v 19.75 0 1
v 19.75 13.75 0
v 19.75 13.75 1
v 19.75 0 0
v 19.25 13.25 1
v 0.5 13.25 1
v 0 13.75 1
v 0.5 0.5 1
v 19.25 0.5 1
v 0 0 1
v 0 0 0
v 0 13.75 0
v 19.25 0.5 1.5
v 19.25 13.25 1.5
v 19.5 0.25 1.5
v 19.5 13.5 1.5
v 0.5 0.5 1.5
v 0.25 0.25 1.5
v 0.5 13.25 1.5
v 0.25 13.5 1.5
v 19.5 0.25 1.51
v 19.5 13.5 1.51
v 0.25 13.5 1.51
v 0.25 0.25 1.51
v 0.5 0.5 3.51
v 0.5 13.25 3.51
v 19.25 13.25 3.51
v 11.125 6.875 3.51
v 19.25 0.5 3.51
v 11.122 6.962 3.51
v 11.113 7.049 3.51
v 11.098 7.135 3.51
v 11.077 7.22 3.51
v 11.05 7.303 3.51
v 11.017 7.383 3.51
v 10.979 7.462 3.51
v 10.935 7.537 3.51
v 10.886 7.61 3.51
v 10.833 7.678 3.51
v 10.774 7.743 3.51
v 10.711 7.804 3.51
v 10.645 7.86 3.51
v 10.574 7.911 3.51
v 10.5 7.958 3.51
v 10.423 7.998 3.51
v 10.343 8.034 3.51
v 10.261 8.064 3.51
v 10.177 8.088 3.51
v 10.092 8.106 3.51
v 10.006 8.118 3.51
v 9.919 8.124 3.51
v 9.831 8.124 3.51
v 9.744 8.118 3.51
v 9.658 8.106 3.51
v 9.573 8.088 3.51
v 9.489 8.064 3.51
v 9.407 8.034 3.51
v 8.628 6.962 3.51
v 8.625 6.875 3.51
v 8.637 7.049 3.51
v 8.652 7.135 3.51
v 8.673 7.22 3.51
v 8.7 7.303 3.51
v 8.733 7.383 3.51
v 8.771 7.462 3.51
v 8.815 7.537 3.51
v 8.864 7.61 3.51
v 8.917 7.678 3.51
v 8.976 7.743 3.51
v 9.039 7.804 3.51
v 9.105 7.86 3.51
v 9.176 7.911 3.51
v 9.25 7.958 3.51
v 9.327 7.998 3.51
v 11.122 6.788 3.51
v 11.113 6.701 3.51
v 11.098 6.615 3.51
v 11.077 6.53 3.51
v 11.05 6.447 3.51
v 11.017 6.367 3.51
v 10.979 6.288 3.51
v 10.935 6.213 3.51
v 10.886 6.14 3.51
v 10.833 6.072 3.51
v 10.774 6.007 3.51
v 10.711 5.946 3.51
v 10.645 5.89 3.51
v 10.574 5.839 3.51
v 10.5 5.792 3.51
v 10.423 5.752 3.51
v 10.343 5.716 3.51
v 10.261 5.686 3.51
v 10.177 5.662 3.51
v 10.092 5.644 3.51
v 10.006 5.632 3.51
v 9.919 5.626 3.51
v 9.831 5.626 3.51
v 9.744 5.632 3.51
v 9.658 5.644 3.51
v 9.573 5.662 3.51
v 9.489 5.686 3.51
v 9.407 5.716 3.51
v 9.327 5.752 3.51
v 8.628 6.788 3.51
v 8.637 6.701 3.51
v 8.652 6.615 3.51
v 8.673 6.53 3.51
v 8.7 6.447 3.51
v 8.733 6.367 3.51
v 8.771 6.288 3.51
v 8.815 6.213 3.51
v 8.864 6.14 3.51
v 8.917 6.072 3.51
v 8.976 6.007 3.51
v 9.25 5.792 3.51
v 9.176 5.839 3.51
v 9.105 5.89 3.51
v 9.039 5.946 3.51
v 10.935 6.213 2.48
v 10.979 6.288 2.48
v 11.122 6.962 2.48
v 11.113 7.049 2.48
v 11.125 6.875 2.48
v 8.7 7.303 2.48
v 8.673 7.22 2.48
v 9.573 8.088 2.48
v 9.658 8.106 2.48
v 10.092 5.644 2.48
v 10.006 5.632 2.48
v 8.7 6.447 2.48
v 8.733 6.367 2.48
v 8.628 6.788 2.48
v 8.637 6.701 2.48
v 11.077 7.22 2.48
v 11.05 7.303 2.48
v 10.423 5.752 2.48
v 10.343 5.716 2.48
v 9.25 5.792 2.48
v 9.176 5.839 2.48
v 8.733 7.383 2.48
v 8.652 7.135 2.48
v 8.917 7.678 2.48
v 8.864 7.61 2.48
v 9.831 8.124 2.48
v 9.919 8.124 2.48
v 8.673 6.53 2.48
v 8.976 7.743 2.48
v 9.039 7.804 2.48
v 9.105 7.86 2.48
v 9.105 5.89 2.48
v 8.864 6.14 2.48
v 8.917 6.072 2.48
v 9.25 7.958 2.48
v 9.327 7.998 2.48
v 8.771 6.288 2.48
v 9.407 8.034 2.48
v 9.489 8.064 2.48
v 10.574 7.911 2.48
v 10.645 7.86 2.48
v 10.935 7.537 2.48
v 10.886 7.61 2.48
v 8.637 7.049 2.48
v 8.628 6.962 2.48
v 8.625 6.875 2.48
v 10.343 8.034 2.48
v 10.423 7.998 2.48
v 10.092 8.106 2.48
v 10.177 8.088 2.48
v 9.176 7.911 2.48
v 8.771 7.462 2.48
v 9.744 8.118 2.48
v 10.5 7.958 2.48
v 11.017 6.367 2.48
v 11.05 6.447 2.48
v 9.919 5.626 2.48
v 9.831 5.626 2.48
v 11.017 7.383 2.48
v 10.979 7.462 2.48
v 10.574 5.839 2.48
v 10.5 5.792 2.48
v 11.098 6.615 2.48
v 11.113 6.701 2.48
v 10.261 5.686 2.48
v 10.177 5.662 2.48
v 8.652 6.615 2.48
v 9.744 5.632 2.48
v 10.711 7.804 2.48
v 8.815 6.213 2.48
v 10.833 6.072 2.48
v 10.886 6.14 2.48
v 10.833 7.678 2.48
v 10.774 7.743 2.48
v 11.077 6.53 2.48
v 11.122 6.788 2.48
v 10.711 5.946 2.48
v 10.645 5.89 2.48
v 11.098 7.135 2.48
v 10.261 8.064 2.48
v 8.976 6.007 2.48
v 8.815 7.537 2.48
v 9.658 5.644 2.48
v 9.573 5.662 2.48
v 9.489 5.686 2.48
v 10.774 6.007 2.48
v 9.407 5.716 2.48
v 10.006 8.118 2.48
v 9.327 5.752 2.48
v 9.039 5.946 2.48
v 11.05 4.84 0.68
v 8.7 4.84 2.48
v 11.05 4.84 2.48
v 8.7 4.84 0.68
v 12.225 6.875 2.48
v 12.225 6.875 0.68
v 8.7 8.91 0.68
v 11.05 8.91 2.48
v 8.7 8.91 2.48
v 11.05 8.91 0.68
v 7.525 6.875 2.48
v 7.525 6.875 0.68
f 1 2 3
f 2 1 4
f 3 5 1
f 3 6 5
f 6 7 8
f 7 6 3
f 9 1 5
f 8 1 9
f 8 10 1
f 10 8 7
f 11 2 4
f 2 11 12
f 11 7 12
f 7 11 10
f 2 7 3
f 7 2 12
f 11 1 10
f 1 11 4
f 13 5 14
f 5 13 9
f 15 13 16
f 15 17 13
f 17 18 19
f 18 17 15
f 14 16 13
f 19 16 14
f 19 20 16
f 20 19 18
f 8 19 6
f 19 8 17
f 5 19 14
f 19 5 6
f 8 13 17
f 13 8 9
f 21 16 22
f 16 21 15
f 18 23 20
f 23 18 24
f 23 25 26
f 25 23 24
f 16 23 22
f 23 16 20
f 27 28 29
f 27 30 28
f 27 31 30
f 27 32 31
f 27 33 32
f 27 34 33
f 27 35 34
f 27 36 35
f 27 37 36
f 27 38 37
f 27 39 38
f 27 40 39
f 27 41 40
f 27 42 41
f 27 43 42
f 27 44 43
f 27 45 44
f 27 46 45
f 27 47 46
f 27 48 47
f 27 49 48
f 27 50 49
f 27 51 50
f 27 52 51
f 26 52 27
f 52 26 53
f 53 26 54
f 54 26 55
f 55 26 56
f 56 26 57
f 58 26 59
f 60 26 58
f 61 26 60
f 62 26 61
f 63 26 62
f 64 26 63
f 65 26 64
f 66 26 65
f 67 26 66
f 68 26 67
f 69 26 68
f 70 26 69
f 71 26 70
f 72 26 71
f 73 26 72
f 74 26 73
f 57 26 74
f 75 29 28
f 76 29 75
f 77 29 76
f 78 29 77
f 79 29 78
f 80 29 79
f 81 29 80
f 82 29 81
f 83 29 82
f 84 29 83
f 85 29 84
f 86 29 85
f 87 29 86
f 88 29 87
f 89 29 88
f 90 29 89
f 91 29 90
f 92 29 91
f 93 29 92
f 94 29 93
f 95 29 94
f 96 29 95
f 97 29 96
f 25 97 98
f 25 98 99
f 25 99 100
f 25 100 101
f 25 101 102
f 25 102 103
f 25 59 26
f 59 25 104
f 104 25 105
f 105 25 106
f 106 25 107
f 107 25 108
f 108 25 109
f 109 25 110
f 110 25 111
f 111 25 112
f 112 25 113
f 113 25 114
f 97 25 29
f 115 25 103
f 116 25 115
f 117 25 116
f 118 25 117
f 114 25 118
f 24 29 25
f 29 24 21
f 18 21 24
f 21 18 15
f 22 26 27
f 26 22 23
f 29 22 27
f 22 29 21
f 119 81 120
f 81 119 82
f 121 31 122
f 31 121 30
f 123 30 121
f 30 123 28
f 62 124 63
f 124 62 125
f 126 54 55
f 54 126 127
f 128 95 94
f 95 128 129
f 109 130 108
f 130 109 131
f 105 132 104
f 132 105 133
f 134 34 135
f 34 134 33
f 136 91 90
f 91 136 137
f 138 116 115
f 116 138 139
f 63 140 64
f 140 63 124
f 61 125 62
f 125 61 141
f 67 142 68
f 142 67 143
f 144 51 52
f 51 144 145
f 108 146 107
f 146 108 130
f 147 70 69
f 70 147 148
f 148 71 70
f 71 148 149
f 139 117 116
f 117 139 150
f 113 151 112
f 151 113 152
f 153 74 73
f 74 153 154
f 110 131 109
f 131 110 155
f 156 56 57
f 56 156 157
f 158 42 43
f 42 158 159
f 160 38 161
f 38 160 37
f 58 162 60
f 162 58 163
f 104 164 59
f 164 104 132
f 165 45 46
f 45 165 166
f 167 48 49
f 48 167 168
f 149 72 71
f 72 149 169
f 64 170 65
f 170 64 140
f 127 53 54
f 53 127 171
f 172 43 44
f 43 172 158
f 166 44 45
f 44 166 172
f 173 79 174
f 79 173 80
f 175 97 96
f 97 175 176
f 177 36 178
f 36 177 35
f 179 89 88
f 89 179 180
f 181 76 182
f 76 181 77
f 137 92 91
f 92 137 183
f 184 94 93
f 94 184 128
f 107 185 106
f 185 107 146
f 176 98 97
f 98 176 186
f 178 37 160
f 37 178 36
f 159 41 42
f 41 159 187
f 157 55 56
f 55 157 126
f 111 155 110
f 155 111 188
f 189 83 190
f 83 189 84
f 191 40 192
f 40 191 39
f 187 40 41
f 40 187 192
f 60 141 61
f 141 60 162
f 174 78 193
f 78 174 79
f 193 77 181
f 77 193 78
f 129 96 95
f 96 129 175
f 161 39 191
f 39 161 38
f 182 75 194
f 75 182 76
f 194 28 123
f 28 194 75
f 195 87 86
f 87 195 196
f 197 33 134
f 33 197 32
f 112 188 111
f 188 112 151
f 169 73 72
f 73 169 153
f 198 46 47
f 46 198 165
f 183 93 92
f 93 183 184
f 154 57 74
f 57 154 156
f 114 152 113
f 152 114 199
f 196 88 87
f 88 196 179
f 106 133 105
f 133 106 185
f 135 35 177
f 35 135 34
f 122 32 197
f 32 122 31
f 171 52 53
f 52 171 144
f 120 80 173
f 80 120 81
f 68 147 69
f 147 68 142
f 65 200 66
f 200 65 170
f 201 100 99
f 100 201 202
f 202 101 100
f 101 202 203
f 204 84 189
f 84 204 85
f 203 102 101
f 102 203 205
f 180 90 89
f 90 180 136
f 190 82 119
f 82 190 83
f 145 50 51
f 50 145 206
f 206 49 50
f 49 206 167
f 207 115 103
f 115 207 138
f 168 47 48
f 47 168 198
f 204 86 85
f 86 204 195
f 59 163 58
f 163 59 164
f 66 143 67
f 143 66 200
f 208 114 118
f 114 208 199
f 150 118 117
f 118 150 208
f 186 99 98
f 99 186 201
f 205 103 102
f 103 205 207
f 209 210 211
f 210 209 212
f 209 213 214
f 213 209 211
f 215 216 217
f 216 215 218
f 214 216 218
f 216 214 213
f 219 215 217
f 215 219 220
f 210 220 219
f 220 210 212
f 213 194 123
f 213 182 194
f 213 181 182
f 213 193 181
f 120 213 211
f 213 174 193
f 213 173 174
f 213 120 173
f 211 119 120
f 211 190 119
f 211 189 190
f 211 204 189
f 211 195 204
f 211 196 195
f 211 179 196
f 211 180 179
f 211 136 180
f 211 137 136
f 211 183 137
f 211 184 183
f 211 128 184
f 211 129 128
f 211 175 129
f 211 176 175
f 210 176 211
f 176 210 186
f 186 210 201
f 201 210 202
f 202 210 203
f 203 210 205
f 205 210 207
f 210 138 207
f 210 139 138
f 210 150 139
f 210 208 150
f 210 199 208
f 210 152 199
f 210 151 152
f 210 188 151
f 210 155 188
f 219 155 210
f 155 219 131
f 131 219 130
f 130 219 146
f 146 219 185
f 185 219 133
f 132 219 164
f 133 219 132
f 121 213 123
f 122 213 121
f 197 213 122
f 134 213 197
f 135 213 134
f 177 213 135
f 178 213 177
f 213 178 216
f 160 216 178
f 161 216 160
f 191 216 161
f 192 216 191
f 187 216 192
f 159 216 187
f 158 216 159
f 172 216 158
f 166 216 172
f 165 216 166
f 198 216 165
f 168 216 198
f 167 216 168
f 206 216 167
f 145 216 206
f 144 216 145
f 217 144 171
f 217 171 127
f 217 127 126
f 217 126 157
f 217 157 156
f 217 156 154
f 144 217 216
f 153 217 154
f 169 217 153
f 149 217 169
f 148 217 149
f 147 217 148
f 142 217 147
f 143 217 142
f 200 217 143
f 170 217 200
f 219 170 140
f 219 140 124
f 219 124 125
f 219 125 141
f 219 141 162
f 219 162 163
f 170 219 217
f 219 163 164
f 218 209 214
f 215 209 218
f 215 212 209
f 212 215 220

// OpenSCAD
eps = 0.01;
tol_z = 0.3;
$fn = 90;
// hole parameters
x = 18.75;
y = 12.75;
t = 0.5;
off = 1;
coff = 0.5;
wt = 1; 

// strip terminal parameters
nh = 1.8;
nd = 4.7;
bd = 2.5;

difference()
{
    union()
    {
        // upper cover
        cube([x+off,y+off,wt]);
        
        // hole fill
        translate([off/2,off/2,wt])
            cube([x,y,t]);
        // sloped cut
        translate([(off-coff)/2,(off-coff)/2,wt+t])
        hull()
        {
            cube([x+coff,y+coff,eps]);
            translate([coff/2,coff/2,2*wt])
                cube([x,y,eps]);
        }
    
    }
    
    h = wt+t+2*wt;
    
    // center frame
    translate([(x+off)/2,(y+off)/2,h])
    {
        // bolt hole
        translate([0,0,-wt-nh+2*eps])
            cylinder(h=wt+nh,d=bd);
        // nut hole
        translate([0,0,-wt-nh-2*eps])
            cylinder(h=nh,d=nd,$fn=6);
    }
    
    
}
